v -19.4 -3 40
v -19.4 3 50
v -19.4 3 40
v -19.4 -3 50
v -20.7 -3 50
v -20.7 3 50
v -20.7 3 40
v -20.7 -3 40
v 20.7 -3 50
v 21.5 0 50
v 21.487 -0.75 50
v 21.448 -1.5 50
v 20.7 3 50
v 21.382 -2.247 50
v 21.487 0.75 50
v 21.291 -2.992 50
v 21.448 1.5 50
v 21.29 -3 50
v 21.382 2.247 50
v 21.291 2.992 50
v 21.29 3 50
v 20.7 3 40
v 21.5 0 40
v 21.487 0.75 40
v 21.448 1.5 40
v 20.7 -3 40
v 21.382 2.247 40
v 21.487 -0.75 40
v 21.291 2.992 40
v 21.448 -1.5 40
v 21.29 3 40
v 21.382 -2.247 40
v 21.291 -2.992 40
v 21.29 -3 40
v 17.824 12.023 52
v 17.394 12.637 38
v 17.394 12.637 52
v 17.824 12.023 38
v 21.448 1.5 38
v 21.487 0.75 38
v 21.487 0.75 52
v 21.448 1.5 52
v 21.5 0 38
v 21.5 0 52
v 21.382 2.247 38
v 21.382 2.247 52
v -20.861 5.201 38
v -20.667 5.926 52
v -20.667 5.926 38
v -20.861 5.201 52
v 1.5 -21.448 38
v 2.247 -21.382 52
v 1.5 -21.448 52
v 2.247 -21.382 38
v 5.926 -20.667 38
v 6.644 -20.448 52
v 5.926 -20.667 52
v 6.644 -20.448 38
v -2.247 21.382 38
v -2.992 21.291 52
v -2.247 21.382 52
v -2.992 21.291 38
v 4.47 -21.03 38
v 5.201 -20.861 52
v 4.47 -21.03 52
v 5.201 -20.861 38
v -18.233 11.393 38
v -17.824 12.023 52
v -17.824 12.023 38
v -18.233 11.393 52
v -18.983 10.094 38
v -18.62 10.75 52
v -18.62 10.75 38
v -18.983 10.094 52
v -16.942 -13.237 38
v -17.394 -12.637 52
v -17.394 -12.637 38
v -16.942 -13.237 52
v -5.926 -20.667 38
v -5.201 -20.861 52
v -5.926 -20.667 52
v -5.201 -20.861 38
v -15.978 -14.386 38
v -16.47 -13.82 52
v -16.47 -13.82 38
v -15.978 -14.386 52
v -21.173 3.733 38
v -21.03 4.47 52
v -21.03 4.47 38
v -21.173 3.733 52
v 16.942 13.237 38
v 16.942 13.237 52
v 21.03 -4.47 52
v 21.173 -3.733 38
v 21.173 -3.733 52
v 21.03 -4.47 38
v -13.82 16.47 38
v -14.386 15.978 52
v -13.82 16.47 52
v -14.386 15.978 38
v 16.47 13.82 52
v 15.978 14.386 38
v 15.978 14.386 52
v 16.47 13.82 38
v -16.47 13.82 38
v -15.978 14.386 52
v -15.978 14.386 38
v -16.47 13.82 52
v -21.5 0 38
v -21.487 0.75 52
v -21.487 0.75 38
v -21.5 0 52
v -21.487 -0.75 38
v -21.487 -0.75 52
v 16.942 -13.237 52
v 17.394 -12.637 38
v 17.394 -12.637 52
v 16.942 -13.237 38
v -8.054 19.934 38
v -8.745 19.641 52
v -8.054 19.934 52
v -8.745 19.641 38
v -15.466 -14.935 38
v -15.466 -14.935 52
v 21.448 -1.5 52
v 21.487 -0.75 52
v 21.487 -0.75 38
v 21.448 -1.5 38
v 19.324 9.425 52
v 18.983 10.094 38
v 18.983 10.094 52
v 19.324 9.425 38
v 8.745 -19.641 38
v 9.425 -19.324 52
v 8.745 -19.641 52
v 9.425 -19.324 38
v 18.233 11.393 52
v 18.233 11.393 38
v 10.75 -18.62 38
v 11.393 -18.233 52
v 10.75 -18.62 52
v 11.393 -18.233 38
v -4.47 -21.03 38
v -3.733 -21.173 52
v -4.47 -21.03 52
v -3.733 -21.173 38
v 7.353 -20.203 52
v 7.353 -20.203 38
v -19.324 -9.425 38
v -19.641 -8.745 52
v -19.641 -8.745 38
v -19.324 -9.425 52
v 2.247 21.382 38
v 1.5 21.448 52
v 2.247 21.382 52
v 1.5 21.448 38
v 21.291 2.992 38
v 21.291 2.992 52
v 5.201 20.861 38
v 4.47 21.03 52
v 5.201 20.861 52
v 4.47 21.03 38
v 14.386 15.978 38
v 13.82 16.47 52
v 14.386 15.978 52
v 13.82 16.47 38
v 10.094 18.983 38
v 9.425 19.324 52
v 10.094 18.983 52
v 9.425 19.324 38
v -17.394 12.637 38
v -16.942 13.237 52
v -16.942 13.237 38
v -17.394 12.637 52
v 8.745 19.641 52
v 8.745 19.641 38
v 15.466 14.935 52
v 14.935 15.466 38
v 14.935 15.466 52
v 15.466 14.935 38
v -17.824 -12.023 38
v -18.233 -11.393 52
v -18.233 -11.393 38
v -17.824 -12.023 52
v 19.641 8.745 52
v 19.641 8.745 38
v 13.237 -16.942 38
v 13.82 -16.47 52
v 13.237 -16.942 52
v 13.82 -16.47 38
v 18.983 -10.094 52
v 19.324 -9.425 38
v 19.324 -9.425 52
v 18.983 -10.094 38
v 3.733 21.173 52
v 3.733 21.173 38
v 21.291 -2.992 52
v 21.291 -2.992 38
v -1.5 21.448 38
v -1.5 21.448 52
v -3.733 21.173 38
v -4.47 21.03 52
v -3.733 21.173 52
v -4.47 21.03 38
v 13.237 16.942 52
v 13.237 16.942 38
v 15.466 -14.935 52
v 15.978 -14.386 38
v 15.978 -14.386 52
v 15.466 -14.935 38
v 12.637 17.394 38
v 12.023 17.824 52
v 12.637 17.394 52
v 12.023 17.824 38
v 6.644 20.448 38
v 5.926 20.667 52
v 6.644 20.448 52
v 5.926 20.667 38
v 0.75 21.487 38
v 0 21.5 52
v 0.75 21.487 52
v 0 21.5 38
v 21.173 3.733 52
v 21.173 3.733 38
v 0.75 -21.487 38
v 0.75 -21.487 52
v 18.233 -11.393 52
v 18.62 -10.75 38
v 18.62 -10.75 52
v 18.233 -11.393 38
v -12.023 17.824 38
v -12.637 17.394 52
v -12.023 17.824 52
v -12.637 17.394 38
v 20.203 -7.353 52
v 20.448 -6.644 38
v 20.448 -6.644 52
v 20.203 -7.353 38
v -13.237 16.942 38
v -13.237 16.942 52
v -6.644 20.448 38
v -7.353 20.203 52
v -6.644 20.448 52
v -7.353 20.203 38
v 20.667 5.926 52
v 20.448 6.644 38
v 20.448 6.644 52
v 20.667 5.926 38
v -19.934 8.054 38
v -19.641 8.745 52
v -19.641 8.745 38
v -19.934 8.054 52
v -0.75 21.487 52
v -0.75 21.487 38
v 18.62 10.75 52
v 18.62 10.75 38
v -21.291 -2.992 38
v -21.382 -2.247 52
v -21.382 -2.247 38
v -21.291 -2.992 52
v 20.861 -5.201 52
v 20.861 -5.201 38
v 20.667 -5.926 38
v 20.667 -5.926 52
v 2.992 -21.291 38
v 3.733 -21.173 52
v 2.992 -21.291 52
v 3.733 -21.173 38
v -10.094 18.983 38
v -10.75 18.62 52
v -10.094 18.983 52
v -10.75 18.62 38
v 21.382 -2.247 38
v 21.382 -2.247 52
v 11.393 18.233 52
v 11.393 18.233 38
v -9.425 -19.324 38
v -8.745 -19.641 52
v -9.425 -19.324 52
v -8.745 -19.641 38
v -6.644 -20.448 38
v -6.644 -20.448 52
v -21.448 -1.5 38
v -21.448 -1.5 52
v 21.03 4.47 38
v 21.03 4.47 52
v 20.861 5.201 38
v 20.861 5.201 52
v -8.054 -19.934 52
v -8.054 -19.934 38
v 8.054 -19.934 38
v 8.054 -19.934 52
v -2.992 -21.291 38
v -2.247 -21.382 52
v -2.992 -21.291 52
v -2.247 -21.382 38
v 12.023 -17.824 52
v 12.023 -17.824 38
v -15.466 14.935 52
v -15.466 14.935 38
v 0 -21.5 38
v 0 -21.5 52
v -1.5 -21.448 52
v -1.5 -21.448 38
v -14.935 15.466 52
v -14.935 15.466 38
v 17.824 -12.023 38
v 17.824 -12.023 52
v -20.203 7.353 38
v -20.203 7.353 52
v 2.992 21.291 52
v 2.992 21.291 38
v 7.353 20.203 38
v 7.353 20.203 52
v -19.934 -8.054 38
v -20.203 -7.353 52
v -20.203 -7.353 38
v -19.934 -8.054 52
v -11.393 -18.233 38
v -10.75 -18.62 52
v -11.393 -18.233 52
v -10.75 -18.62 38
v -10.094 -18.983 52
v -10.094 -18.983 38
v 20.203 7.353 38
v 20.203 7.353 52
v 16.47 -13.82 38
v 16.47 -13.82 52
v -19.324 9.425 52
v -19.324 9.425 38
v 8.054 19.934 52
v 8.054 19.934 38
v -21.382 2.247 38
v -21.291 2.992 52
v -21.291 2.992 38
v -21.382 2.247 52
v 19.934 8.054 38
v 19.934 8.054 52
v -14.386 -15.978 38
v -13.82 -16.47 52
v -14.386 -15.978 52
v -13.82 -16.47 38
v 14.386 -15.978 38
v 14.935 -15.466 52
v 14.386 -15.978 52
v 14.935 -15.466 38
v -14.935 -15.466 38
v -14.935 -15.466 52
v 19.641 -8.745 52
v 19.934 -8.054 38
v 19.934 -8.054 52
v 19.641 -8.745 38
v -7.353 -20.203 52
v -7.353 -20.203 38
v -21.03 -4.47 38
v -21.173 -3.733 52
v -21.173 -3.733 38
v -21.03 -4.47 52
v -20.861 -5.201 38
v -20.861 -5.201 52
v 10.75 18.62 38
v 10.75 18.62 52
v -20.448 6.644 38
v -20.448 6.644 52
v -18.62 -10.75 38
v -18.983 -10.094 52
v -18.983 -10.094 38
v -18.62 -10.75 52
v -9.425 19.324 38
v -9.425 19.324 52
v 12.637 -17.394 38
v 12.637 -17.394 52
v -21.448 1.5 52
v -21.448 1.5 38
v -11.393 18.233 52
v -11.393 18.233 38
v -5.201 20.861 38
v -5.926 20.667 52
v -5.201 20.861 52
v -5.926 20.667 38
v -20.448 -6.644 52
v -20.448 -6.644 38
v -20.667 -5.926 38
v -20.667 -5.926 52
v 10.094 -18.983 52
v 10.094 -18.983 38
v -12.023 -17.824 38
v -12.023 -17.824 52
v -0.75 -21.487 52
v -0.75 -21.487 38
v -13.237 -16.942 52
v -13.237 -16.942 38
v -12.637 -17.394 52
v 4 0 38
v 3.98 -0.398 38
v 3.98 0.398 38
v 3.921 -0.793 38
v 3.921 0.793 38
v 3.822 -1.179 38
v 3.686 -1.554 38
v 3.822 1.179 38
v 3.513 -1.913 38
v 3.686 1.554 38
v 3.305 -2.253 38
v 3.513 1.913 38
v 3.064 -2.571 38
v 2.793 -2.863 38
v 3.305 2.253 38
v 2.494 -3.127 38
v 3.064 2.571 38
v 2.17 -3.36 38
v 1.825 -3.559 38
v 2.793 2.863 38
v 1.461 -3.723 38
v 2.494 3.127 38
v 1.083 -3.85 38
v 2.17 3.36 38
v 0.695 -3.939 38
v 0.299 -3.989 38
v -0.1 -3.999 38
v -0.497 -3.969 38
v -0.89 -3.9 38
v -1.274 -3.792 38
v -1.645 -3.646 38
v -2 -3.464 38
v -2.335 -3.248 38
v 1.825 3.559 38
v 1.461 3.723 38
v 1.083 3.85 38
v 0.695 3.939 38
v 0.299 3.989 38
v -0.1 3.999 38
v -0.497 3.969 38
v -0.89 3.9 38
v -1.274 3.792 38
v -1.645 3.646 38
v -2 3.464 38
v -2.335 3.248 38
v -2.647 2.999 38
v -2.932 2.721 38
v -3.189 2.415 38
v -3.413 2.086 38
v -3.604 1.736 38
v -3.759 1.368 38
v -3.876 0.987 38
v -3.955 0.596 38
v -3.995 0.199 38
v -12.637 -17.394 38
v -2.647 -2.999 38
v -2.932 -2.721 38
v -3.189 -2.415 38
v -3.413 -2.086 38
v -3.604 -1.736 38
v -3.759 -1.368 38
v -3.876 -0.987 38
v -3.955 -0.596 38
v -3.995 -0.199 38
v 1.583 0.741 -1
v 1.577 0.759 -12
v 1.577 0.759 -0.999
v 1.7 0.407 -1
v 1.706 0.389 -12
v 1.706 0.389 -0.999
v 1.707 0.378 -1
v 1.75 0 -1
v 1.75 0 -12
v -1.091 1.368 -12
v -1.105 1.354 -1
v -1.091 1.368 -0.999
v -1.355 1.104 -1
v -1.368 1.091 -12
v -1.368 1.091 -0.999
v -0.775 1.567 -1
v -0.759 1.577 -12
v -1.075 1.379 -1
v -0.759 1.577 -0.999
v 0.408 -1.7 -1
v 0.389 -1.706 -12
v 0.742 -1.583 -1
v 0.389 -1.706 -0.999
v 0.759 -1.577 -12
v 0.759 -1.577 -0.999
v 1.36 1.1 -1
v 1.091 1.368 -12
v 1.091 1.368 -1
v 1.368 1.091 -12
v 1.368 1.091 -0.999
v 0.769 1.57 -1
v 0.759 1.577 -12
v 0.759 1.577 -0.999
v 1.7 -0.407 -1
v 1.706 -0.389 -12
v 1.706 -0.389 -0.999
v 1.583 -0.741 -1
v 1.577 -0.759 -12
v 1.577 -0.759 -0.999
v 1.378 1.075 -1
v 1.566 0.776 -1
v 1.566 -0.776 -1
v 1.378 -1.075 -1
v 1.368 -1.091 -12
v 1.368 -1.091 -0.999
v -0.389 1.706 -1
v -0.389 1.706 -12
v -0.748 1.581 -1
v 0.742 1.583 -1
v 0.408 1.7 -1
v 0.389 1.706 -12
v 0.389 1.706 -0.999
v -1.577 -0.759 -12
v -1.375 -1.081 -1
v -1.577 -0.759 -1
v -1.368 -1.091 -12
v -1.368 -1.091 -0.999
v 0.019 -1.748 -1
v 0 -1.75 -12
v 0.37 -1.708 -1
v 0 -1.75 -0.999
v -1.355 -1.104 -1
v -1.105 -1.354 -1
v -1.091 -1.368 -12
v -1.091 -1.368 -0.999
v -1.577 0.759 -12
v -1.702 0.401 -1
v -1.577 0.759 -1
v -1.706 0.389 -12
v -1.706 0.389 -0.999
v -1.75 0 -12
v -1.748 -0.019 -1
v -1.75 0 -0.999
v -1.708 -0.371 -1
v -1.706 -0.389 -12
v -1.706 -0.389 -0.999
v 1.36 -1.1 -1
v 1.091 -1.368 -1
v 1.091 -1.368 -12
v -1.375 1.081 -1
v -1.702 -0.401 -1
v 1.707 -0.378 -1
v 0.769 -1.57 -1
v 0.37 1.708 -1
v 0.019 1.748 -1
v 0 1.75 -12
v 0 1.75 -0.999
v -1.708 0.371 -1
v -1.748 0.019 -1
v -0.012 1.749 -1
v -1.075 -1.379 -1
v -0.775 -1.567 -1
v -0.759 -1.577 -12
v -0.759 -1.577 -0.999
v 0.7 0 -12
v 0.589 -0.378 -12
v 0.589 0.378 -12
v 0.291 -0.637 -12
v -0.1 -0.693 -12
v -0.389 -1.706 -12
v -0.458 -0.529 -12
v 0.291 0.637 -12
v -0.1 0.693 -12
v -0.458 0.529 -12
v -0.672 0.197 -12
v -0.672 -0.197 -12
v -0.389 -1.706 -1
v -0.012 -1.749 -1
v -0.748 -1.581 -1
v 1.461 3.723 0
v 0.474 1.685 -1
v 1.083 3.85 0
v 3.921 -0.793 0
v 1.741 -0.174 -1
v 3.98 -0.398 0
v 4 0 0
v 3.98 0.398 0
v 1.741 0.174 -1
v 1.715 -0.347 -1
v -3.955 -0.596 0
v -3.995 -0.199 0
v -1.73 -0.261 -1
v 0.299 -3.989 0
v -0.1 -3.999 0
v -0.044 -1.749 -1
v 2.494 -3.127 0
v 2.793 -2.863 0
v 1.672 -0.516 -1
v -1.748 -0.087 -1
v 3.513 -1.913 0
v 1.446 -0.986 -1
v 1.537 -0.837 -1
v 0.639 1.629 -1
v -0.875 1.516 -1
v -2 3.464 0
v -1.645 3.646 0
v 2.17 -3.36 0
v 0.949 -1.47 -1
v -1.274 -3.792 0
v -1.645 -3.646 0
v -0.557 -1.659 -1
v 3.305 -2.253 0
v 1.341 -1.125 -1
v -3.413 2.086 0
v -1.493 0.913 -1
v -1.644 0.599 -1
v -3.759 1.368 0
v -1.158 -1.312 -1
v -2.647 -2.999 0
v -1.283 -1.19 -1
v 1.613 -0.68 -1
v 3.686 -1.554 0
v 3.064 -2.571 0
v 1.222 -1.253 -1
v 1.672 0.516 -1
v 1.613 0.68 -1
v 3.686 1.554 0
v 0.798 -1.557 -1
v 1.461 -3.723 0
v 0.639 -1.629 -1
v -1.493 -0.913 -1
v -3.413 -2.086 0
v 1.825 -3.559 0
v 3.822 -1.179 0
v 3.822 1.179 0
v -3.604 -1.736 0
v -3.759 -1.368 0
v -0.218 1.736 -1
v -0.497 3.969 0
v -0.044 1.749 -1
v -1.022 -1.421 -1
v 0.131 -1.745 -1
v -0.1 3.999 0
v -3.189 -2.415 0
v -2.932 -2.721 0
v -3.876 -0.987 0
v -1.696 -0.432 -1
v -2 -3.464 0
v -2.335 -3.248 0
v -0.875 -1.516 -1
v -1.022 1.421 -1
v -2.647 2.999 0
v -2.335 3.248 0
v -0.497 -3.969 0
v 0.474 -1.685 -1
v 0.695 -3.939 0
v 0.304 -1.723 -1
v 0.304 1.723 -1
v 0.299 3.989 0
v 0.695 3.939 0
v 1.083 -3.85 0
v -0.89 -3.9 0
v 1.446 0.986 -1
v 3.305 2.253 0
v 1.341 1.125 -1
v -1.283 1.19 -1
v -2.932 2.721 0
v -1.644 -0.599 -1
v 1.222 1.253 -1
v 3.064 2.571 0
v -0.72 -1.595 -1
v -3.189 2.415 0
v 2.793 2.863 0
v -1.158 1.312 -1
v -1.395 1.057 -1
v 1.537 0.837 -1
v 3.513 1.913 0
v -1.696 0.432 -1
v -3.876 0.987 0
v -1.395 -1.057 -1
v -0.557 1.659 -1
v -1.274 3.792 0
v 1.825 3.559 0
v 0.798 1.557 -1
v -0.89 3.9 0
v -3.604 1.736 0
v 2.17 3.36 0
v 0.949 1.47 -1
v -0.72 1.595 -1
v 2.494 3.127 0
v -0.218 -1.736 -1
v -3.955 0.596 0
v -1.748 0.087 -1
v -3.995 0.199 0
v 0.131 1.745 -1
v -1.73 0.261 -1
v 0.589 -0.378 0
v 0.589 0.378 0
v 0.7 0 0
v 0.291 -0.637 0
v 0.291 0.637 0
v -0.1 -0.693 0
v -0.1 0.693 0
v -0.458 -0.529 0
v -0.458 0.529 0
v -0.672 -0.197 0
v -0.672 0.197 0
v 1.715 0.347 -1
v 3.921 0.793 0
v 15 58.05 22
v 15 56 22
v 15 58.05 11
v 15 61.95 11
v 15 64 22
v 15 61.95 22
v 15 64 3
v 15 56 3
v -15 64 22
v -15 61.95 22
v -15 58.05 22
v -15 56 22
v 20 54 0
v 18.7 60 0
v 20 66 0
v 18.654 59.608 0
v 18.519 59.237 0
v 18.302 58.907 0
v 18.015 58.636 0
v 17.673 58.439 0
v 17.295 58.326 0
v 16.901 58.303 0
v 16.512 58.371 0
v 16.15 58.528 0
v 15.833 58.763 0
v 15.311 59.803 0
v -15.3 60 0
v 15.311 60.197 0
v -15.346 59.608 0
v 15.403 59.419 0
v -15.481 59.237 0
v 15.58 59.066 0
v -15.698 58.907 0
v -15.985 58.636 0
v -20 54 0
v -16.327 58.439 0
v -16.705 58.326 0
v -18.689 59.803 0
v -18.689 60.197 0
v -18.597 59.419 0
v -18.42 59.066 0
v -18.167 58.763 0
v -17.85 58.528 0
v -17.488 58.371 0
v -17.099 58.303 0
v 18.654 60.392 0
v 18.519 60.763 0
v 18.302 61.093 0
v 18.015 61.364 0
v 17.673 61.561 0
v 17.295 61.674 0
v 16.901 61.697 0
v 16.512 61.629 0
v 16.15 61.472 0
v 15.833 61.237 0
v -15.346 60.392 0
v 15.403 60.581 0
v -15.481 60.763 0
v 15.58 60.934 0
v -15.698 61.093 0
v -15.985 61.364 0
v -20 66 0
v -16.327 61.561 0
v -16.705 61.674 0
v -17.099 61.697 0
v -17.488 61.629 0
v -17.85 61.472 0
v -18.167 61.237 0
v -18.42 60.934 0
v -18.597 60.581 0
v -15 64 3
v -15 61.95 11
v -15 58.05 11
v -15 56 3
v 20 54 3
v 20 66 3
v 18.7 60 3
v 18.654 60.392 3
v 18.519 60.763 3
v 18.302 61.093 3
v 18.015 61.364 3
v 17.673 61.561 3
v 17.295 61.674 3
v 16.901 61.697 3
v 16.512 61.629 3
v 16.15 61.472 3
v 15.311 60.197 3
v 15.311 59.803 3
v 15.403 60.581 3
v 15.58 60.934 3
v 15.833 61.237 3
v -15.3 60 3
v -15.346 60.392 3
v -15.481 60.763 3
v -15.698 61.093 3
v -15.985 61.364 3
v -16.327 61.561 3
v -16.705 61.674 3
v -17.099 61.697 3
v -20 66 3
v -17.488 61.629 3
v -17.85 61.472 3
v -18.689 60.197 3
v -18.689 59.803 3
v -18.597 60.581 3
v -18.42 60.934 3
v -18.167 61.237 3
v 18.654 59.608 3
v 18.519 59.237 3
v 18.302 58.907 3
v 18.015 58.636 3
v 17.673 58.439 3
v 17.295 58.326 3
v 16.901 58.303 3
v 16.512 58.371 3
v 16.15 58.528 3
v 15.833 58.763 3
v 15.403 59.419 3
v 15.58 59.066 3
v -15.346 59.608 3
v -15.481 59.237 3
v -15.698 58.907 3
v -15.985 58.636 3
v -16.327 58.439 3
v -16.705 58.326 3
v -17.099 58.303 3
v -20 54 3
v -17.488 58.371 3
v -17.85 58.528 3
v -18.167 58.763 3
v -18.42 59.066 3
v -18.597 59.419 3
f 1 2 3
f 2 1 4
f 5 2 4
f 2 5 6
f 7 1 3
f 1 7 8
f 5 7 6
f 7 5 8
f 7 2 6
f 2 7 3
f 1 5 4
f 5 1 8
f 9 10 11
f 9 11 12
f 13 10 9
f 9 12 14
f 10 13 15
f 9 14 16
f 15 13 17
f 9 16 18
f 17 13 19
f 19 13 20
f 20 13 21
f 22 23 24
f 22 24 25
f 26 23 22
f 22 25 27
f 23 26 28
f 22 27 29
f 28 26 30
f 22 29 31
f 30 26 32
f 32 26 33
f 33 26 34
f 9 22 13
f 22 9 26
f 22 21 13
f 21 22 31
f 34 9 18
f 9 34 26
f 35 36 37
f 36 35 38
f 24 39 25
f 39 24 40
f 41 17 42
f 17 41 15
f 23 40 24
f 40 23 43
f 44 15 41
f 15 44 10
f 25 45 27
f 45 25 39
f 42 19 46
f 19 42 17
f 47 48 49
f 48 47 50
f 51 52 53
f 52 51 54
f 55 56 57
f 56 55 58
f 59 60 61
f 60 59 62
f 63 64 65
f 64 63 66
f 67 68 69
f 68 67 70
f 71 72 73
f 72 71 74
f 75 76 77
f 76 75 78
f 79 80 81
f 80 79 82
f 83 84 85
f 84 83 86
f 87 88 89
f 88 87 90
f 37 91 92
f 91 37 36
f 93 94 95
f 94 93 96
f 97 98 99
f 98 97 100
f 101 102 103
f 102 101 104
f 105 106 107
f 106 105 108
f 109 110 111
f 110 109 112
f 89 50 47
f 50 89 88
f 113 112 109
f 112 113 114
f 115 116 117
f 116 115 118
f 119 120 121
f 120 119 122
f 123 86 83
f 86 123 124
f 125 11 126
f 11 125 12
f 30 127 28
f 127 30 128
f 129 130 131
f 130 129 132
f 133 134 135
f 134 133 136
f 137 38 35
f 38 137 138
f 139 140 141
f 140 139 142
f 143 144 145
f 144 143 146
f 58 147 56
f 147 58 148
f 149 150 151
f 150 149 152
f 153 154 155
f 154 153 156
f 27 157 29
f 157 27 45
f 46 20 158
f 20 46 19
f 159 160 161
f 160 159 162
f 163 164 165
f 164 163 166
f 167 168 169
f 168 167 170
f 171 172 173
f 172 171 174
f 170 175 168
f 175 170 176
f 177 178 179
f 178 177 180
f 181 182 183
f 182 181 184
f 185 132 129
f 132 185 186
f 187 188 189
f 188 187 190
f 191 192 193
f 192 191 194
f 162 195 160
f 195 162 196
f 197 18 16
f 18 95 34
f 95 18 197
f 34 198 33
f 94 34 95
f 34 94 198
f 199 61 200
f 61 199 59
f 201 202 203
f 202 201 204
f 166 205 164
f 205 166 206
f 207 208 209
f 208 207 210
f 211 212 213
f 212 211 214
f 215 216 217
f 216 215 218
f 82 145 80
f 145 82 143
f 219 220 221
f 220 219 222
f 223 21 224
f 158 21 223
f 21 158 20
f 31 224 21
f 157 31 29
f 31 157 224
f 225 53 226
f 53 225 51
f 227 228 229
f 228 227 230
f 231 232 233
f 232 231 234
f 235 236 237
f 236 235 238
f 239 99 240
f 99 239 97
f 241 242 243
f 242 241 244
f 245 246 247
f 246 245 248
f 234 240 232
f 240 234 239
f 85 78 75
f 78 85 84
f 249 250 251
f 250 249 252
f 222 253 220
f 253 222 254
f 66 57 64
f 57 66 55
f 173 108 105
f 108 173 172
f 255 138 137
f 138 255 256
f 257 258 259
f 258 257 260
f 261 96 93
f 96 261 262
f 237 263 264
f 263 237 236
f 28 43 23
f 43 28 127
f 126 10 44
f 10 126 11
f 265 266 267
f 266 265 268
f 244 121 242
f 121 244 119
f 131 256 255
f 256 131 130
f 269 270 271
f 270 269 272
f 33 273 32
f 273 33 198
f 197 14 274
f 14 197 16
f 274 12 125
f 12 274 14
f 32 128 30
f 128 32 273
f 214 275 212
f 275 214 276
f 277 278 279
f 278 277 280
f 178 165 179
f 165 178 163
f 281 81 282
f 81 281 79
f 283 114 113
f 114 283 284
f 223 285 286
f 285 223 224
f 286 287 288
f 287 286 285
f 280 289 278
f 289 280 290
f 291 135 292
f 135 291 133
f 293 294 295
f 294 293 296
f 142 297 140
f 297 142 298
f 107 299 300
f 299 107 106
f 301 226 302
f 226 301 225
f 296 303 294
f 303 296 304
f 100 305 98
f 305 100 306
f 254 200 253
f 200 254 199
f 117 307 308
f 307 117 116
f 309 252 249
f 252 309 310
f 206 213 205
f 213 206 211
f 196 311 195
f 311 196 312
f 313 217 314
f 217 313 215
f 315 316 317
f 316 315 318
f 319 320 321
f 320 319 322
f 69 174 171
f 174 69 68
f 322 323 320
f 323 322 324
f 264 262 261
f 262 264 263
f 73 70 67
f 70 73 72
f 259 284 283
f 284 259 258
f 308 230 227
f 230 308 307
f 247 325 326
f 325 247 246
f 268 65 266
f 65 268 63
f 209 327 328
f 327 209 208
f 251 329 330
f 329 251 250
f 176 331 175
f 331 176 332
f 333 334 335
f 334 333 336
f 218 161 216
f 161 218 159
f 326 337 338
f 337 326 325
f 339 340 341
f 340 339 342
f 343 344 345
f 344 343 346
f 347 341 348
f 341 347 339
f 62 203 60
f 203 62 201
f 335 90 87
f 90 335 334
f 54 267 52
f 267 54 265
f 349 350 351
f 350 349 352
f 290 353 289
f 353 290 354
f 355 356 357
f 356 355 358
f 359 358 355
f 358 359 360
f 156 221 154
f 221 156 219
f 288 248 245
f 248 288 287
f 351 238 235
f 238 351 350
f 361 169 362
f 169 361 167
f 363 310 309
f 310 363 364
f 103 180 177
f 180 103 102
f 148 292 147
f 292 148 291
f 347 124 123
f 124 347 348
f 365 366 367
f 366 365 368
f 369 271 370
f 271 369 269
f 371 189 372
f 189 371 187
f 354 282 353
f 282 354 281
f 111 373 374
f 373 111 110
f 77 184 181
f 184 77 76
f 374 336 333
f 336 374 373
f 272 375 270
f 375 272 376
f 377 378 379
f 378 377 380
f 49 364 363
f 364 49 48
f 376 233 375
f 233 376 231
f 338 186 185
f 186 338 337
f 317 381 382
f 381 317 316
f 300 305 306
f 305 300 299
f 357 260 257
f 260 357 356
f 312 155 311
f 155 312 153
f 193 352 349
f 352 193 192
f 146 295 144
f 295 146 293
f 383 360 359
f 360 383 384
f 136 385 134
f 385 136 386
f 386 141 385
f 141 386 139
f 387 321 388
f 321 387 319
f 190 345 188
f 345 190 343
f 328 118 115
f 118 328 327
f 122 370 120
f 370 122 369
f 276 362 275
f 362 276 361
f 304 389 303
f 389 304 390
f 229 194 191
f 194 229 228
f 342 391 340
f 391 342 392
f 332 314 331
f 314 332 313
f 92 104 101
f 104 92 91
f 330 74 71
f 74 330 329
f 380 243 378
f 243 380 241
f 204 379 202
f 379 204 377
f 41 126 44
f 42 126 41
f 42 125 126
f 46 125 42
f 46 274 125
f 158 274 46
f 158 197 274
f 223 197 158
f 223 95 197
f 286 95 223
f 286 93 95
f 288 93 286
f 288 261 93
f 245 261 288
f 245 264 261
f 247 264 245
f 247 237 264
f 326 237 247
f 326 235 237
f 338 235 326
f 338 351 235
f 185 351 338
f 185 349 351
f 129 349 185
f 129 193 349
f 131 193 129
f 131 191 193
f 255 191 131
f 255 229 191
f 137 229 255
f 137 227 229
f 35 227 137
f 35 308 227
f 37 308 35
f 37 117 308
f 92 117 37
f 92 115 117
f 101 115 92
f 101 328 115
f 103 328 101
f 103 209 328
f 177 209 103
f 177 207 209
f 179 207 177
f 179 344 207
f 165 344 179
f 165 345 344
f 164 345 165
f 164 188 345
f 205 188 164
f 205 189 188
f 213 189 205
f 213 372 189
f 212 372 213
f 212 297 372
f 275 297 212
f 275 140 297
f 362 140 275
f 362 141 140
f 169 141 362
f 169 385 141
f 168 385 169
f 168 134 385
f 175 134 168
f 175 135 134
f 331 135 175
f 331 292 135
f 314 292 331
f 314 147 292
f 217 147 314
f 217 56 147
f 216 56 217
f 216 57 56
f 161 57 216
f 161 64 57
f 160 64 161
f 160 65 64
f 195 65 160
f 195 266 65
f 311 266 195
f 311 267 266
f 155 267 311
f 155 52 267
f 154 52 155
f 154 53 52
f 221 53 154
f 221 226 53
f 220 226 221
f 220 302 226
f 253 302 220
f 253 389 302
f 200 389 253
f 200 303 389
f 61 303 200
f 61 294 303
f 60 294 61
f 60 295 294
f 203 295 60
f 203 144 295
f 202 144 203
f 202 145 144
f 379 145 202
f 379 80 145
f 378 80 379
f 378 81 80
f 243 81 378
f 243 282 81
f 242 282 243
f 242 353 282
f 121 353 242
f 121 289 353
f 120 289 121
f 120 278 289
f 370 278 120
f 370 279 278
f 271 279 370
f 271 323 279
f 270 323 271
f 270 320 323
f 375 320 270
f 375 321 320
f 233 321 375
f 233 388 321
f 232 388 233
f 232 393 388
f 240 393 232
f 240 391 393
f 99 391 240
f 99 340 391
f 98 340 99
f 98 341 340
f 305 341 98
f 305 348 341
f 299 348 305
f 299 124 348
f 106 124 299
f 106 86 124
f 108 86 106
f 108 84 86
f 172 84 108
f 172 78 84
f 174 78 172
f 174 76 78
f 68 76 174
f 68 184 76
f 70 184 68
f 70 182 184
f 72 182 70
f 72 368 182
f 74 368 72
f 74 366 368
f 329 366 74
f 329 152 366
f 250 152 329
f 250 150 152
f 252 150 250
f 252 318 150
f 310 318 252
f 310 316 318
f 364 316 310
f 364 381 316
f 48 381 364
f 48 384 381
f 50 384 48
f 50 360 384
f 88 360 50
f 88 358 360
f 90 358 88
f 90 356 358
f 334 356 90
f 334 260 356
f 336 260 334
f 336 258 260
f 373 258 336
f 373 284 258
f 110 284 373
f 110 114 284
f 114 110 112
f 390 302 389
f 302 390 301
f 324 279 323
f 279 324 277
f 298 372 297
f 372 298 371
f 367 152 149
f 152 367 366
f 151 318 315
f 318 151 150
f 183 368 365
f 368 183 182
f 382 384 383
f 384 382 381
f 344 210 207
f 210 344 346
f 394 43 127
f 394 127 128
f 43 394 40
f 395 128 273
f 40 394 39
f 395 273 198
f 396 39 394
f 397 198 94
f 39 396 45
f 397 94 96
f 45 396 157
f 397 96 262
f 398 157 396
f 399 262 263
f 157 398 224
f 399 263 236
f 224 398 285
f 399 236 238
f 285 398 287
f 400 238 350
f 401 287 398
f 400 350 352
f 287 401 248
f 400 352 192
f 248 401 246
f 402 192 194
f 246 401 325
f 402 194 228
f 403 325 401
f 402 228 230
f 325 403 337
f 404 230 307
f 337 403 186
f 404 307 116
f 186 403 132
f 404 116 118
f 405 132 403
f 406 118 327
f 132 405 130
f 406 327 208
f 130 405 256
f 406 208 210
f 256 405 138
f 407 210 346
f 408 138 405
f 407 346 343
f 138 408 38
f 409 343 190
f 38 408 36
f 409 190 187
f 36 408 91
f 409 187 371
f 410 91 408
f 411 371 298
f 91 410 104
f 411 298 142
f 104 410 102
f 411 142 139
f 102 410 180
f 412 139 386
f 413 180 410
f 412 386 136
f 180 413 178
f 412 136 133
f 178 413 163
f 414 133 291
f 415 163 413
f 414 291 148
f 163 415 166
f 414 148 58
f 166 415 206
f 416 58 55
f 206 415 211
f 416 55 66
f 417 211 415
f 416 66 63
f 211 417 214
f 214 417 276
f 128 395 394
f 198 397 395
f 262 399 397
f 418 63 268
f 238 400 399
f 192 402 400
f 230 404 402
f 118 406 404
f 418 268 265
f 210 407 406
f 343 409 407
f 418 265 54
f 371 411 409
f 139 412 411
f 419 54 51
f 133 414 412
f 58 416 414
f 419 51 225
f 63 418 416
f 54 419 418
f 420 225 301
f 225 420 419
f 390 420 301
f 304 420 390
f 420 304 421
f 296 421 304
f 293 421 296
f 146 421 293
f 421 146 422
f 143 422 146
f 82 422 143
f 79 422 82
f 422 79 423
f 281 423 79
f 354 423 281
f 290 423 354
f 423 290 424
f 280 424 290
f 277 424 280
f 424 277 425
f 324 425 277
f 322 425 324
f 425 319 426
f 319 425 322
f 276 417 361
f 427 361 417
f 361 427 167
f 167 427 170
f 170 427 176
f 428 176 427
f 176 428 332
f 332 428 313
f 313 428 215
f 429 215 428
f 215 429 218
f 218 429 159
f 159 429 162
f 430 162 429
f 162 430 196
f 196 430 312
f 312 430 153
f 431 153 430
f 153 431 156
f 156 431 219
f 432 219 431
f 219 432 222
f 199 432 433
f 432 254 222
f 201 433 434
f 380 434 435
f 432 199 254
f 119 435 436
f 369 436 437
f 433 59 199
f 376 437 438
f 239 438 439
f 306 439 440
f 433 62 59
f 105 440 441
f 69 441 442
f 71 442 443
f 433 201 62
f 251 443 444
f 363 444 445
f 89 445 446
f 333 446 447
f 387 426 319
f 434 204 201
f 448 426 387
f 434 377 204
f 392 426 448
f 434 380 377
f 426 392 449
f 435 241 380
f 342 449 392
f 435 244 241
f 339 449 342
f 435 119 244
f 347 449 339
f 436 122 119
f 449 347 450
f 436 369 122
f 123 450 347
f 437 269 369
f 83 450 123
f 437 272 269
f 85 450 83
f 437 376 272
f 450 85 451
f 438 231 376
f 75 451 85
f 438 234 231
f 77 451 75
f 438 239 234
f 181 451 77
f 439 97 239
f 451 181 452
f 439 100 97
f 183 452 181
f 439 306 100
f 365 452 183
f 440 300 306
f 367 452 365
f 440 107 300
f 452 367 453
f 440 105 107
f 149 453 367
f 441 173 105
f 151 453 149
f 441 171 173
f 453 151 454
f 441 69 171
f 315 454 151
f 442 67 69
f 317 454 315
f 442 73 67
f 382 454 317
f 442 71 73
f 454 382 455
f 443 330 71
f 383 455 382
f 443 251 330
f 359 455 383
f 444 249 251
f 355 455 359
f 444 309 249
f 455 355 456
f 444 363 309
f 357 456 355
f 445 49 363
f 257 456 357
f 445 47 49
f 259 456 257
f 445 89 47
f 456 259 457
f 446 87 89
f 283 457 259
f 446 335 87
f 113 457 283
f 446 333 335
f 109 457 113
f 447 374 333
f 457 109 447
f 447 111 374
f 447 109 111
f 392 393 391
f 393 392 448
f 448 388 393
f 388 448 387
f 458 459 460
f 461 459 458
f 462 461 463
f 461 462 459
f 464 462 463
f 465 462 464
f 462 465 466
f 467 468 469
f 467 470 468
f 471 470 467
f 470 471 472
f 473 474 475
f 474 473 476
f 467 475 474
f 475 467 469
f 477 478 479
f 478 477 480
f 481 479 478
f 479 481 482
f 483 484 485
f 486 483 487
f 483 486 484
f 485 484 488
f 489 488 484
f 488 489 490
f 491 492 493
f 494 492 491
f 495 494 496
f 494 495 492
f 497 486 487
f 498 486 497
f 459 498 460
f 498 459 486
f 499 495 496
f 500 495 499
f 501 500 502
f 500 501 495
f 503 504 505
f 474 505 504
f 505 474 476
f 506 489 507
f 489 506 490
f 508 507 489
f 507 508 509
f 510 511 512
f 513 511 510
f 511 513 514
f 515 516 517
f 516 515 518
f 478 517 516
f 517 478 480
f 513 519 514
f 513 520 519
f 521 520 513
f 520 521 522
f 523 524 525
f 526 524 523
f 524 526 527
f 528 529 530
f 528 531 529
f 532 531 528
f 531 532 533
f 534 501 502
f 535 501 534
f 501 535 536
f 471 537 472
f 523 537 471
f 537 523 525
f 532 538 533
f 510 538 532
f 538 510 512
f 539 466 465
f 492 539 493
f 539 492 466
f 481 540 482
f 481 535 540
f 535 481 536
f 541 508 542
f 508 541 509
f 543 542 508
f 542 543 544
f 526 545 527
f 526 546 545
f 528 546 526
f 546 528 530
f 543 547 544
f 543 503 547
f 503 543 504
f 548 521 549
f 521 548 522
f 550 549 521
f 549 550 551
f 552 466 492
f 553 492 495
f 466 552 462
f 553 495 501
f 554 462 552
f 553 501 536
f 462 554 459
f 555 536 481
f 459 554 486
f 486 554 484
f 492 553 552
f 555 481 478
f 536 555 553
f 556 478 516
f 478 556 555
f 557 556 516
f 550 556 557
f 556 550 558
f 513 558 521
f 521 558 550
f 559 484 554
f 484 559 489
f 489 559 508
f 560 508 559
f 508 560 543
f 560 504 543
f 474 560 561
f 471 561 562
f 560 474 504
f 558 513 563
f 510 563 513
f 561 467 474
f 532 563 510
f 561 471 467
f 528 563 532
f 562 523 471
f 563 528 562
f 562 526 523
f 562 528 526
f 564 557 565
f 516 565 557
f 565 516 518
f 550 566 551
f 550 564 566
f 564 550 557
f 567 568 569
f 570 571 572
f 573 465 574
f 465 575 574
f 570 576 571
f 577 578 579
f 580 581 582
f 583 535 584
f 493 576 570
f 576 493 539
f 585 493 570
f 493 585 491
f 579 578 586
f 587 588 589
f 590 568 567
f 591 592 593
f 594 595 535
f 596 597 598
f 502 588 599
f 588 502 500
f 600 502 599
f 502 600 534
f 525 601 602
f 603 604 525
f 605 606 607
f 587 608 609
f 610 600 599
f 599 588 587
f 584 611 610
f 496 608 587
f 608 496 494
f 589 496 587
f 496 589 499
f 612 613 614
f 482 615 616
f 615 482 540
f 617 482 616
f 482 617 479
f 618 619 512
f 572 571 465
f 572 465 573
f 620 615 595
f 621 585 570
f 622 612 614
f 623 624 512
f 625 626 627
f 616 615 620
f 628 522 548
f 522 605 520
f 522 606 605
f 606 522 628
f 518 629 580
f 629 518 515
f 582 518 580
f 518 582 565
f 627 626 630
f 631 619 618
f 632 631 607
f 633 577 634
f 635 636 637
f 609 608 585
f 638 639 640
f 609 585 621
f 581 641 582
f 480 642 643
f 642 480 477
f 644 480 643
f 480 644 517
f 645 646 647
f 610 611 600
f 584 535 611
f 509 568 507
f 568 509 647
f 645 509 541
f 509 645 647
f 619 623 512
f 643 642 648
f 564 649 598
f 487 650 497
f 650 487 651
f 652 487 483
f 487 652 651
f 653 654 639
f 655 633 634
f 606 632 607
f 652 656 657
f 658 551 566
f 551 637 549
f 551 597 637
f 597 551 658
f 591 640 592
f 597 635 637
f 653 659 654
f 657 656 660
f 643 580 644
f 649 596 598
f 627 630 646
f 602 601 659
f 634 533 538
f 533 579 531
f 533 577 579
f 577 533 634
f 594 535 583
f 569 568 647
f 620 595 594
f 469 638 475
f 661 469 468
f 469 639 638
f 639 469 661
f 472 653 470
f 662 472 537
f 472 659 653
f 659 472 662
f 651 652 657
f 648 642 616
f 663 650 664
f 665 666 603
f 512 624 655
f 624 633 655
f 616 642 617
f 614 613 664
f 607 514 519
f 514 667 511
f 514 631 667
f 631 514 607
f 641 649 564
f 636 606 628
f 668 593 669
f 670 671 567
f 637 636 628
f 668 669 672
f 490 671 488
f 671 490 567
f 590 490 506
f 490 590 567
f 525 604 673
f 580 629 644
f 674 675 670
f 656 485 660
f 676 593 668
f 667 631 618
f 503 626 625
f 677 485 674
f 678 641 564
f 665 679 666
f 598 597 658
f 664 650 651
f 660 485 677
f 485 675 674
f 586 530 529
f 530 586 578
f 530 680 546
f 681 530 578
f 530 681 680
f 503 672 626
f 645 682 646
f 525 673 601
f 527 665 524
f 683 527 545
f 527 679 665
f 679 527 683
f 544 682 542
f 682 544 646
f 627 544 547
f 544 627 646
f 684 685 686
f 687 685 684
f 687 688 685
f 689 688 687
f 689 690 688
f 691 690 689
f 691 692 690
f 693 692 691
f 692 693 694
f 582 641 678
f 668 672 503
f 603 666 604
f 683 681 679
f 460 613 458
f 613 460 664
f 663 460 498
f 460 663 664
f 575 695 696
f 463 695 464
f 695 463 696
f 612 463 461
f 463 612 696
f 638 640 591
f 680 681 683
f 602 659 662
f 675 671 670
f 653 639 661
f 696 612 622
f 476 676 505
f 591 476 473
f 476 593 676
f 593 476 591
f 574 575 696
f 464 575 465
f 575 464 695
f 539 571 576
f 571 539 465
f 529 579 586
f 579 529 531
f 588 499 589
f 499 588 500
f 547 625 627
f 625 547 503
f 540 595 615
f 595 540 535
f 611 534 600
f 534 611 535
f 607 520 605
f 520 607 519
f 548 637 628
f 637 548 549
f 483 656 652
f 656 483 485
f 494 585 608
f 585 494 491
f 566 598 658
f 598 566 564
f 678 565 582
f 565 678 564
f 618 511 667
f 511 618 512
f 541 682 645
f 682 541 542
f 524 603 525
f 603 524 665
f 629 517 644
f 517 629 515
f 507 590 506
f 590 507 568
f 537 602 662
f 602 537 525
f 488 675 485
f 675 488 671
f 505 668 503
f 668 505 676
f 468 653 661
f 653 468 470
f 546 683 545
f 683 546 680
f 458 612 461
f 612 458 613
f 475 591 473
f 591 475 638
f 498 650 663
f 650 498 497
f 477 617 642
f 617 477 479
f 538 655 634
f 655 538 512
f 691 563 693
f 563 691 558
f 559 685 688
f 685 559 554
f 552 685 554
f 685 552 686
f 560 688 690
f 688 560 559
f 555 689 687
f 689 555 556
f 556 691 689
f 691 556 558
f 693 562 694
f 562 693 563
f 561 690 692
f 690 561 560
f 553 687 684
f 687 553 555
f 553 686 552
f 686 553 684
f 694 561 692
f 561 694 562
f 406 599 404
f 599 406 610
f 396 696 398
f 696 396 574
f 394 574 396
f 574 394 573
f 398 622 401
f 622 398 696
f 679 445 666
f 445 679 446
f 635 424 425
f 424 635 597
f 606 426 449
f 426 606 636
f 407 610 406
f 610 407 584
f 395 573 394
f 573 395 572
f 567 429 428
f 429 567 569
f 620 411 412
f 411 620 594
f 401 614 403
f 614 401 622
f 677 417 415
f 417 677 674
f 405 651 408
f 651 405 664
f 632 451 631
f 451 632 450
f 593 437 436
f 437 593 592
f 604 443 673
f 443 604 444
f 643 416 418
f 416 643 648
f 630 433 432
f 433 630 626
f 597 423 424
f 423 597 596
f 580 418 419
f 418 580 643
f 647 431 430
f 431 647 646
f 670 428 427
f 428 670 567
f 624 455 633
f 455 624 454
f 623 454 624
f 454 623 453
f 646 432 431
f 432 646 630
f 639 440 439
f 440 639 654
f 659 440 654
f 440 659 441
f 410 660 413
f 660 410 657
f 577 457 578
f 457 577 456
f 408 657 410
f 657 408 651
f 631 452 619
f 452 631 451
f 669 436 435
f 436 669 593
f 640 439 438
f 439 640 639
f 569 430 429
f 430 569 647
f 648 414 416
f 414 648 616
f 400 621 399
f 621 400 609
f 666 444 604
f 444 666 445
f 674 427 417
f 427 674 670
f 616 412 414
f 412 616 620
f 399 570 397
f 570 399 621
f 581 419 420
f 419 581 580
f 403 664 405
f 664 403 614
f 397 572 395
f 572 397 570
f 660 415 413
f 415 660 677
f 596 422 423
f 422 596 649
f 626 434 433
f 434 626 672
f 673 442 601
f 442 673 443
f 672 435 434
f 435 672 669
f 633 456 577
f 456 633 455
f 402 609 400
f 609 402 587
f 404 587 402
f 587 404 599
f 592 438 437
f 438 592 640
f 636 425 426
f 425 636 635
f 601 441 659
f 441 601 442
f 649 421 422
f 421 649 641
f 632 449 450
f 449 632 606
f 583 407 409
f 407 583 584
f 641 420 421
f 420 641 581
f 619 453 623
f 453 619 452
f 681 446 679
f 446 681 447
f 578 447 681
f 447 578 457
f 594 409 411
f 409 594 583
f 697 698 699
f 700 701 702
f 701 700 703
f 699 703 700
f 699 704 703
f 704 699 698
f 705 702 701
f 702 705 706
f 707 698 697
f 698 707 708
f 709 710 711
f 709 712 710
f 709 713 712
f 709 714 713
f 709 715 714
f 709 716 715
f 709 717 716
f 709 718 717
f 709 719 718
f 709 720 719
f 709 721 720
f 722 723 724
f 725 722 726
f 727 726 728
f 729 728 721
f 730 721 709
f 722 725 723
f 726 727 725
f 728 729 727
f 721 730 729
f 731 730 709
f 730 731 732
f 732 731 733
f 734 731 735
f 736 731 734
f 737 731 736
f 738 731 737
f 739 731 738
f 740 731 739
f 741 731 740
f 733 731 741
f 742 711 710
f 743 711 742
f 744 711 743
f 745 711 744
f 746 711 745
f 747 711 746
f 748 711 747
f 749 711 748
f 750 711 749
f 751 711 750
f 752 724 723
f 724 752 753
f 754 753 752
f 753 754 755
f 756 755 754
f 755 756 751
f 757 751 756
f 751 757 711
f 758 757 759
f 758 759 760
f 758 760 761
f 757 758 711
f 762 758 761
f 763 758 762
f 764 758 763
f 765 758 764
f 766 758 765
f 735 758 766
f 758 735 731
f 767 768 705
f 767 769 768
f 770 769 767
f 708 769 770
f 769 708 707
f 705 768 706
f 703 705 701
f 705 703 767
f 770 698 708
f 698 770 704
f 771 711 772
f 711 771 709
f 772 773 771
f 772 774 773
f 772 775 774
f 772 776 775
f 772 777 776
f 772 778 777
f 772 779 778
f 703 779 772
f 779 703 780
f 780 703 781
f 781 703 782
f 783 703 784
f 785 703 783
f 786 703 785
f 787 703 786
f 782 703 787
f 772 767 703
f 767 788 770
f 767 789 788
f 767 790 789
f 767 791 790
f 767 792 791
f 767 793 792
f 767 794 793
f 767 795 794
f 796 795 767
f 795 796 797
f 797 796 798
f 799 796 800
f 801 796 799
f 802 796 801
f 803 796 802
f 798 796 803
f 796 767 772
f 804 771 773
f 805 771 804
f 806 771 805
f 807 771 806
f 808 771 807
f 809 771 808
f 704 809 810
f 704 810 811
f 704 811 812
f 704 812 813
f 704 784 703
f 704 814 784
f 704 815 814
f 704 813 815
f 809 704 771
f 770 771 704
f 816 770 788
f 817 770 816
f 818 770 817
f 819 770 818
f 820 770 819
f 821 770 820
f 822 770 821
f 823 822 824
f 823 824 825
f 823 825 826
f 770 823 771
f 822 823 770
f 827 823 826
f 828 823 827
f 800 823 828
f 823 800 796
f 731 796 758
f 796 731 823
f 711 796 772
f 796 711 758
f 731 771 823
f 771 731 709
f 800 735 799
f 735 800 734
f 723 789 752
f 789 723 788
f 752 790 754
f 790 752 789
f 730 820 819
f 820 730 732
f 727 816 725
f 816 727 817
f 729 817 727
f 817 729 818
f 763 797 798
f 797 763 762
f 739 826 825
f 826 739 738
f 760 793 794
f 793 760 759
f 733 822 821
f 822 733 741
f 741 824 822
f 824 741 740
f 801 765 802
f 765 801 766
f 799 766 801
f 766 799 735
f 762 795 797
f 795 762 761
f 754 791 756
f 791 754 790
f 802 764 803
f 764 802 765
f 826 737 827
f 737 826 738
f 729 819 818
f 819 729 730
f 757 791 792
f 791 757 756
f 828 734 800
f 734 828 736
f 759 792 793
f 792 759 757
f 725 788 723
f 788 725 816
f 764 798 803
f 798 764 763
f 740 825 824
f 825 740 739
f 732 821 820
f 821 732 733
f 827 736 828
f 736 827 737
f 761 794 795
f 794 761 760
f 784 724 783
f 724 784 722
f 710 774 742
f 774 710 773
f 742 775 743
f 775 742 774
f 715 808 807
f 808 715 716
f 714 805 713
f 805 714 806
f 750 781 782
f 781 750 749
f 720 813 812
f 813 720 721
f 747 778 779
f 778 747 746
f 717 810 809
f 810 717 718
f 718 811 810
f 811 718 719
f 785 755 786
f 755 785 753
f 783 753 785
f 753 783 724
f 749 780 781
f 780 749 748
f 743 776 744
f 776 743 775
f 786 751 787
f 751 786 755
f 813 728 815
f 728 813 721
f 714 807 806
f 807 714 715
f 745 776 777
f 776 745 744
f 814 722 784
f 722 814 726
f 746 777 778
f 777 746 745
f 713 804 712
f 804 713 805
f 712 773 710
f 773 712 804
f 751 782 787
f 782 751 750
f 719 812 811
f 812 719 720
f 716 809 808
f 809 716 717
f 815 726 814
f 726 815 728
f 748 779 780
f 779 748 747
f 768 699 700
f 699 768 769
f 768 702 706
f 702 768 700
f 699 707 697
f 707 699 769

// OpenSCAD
// =====================================================================
// alternatives/C_capillary_wiper.scad — Capillary dip + fixed wiper
// (concept C: printable mini-SWILE / PowderPicking analogue).
// ---------------------------------------------------------------------
// A spindle-mounted vertical rod ends in a small capillary tip. The
// gantry dips the tip into a powder bed; cohesive fines pack into the
// capillary; a *fixed* printed wiper bar on the bed strikes off any
// excess as the tip retracts. The struck-off plug is then ejected at
// the target by tapping or by a thin printed plunger inside the bore.
// =====================================================================

$fa = 2; $fs = 0.4;

// --- Parameters (mm) -------------------------------------------------
boss_d        = 43;
boss_h        = 14;
boss_flat_w   = 6;
boss_flat_d   = 0.8;
shank_d       = 8.0;
shank_l       = 38;            // length below the clamp
tip_d_outer   = 3.5;            // outer dia of the capillary tip
tip_d_inner   = 1.4;            // bore that actually holds the powder plug
tip_l         = 12;             // capillary length (sets max plug volume)

// fixed wiper (printed companion piece, lives on the bed)
wiper_w       = 30;
wiper_h       = 8;
wiper_t       = 3;
wiper_slot_w  = tip_d_outer + 0.4;   // slot the tip enters
wiper_post_h  = 22;                  // post height of the wiper above bed

module c_pickup_rod() {
    // boss
    translate([0, 0, shank_l])
        difference() {
            cylinder(d = boss_d, h = boss_h);
            // wrench-flats
            for (sx = [-1, 1])
                translate([sx*(boss_d/2 - boss_flat_d),
                           -boss_flat_w/2, 2])
                    cube([boss_flat_d + 0.5, boss_flat_w, boss_h - 4]);
        }
    // shank
    cylinder(d = shank_d, h = shank_l + 0.5);
    // capillary tip (steps down)
    difference() {
        union() {
            translate([0, 0, -tip_l])
                cylinder(d = tip_d_outer, h = tip_l + 0.5);
            // small chamfer step at shank-to-tip junction for printability
            translate([0, 0, -1.0])
                cylinder(d1 = tip_d_outer, d2 = shank_d, h = 1.0);
        }
        // capillary bore
        translate([0, 0, -tip_l - 0.1])
            cylinder(d = tip_d_inner, h = tip_l + shank_l + boss_h + 1);
    }
}

module c_wiper_post() {
    // bed-mounted wiper post that strikes off the excess. Lives on the
    // 3018 bed offset from the powder cup; the gantry dips, lifts,
    // then drags the tip across the slot to wipe.
    translate([0, 60, 0]) {       // offset so it doesn't intersect the rod
        difference() {
            union() {
                translate([-wiper_w/2, -wiper_h/2, 0])
                    cube([wiper_w, wiper_h, wiper_post_h]);
                translate([-wiper_w/2 - 5, -wiper_h/2 - 2, 0])
                    cube([wiper_w + 10, wiper_h + 4, 3]);   // base flange
            }
            // slot the capillary tip drags through
            translate([-wiper_w/2 - 1, -wiper_slot_w/2,
                       wiper_post_h - tip_l + 1])
                cube([wiper_w + 2, wiper_slot_w, tip_l]);
            // M3 mounting holes
            for (sx = [-1, 1])
                translate([sx*(wiper_w/2 + 2), 0, -0.1])
                    cylinder(d = 3.4, h = 4);
        }
    }
}

c_pickup_rod();
c_wiper_post();
